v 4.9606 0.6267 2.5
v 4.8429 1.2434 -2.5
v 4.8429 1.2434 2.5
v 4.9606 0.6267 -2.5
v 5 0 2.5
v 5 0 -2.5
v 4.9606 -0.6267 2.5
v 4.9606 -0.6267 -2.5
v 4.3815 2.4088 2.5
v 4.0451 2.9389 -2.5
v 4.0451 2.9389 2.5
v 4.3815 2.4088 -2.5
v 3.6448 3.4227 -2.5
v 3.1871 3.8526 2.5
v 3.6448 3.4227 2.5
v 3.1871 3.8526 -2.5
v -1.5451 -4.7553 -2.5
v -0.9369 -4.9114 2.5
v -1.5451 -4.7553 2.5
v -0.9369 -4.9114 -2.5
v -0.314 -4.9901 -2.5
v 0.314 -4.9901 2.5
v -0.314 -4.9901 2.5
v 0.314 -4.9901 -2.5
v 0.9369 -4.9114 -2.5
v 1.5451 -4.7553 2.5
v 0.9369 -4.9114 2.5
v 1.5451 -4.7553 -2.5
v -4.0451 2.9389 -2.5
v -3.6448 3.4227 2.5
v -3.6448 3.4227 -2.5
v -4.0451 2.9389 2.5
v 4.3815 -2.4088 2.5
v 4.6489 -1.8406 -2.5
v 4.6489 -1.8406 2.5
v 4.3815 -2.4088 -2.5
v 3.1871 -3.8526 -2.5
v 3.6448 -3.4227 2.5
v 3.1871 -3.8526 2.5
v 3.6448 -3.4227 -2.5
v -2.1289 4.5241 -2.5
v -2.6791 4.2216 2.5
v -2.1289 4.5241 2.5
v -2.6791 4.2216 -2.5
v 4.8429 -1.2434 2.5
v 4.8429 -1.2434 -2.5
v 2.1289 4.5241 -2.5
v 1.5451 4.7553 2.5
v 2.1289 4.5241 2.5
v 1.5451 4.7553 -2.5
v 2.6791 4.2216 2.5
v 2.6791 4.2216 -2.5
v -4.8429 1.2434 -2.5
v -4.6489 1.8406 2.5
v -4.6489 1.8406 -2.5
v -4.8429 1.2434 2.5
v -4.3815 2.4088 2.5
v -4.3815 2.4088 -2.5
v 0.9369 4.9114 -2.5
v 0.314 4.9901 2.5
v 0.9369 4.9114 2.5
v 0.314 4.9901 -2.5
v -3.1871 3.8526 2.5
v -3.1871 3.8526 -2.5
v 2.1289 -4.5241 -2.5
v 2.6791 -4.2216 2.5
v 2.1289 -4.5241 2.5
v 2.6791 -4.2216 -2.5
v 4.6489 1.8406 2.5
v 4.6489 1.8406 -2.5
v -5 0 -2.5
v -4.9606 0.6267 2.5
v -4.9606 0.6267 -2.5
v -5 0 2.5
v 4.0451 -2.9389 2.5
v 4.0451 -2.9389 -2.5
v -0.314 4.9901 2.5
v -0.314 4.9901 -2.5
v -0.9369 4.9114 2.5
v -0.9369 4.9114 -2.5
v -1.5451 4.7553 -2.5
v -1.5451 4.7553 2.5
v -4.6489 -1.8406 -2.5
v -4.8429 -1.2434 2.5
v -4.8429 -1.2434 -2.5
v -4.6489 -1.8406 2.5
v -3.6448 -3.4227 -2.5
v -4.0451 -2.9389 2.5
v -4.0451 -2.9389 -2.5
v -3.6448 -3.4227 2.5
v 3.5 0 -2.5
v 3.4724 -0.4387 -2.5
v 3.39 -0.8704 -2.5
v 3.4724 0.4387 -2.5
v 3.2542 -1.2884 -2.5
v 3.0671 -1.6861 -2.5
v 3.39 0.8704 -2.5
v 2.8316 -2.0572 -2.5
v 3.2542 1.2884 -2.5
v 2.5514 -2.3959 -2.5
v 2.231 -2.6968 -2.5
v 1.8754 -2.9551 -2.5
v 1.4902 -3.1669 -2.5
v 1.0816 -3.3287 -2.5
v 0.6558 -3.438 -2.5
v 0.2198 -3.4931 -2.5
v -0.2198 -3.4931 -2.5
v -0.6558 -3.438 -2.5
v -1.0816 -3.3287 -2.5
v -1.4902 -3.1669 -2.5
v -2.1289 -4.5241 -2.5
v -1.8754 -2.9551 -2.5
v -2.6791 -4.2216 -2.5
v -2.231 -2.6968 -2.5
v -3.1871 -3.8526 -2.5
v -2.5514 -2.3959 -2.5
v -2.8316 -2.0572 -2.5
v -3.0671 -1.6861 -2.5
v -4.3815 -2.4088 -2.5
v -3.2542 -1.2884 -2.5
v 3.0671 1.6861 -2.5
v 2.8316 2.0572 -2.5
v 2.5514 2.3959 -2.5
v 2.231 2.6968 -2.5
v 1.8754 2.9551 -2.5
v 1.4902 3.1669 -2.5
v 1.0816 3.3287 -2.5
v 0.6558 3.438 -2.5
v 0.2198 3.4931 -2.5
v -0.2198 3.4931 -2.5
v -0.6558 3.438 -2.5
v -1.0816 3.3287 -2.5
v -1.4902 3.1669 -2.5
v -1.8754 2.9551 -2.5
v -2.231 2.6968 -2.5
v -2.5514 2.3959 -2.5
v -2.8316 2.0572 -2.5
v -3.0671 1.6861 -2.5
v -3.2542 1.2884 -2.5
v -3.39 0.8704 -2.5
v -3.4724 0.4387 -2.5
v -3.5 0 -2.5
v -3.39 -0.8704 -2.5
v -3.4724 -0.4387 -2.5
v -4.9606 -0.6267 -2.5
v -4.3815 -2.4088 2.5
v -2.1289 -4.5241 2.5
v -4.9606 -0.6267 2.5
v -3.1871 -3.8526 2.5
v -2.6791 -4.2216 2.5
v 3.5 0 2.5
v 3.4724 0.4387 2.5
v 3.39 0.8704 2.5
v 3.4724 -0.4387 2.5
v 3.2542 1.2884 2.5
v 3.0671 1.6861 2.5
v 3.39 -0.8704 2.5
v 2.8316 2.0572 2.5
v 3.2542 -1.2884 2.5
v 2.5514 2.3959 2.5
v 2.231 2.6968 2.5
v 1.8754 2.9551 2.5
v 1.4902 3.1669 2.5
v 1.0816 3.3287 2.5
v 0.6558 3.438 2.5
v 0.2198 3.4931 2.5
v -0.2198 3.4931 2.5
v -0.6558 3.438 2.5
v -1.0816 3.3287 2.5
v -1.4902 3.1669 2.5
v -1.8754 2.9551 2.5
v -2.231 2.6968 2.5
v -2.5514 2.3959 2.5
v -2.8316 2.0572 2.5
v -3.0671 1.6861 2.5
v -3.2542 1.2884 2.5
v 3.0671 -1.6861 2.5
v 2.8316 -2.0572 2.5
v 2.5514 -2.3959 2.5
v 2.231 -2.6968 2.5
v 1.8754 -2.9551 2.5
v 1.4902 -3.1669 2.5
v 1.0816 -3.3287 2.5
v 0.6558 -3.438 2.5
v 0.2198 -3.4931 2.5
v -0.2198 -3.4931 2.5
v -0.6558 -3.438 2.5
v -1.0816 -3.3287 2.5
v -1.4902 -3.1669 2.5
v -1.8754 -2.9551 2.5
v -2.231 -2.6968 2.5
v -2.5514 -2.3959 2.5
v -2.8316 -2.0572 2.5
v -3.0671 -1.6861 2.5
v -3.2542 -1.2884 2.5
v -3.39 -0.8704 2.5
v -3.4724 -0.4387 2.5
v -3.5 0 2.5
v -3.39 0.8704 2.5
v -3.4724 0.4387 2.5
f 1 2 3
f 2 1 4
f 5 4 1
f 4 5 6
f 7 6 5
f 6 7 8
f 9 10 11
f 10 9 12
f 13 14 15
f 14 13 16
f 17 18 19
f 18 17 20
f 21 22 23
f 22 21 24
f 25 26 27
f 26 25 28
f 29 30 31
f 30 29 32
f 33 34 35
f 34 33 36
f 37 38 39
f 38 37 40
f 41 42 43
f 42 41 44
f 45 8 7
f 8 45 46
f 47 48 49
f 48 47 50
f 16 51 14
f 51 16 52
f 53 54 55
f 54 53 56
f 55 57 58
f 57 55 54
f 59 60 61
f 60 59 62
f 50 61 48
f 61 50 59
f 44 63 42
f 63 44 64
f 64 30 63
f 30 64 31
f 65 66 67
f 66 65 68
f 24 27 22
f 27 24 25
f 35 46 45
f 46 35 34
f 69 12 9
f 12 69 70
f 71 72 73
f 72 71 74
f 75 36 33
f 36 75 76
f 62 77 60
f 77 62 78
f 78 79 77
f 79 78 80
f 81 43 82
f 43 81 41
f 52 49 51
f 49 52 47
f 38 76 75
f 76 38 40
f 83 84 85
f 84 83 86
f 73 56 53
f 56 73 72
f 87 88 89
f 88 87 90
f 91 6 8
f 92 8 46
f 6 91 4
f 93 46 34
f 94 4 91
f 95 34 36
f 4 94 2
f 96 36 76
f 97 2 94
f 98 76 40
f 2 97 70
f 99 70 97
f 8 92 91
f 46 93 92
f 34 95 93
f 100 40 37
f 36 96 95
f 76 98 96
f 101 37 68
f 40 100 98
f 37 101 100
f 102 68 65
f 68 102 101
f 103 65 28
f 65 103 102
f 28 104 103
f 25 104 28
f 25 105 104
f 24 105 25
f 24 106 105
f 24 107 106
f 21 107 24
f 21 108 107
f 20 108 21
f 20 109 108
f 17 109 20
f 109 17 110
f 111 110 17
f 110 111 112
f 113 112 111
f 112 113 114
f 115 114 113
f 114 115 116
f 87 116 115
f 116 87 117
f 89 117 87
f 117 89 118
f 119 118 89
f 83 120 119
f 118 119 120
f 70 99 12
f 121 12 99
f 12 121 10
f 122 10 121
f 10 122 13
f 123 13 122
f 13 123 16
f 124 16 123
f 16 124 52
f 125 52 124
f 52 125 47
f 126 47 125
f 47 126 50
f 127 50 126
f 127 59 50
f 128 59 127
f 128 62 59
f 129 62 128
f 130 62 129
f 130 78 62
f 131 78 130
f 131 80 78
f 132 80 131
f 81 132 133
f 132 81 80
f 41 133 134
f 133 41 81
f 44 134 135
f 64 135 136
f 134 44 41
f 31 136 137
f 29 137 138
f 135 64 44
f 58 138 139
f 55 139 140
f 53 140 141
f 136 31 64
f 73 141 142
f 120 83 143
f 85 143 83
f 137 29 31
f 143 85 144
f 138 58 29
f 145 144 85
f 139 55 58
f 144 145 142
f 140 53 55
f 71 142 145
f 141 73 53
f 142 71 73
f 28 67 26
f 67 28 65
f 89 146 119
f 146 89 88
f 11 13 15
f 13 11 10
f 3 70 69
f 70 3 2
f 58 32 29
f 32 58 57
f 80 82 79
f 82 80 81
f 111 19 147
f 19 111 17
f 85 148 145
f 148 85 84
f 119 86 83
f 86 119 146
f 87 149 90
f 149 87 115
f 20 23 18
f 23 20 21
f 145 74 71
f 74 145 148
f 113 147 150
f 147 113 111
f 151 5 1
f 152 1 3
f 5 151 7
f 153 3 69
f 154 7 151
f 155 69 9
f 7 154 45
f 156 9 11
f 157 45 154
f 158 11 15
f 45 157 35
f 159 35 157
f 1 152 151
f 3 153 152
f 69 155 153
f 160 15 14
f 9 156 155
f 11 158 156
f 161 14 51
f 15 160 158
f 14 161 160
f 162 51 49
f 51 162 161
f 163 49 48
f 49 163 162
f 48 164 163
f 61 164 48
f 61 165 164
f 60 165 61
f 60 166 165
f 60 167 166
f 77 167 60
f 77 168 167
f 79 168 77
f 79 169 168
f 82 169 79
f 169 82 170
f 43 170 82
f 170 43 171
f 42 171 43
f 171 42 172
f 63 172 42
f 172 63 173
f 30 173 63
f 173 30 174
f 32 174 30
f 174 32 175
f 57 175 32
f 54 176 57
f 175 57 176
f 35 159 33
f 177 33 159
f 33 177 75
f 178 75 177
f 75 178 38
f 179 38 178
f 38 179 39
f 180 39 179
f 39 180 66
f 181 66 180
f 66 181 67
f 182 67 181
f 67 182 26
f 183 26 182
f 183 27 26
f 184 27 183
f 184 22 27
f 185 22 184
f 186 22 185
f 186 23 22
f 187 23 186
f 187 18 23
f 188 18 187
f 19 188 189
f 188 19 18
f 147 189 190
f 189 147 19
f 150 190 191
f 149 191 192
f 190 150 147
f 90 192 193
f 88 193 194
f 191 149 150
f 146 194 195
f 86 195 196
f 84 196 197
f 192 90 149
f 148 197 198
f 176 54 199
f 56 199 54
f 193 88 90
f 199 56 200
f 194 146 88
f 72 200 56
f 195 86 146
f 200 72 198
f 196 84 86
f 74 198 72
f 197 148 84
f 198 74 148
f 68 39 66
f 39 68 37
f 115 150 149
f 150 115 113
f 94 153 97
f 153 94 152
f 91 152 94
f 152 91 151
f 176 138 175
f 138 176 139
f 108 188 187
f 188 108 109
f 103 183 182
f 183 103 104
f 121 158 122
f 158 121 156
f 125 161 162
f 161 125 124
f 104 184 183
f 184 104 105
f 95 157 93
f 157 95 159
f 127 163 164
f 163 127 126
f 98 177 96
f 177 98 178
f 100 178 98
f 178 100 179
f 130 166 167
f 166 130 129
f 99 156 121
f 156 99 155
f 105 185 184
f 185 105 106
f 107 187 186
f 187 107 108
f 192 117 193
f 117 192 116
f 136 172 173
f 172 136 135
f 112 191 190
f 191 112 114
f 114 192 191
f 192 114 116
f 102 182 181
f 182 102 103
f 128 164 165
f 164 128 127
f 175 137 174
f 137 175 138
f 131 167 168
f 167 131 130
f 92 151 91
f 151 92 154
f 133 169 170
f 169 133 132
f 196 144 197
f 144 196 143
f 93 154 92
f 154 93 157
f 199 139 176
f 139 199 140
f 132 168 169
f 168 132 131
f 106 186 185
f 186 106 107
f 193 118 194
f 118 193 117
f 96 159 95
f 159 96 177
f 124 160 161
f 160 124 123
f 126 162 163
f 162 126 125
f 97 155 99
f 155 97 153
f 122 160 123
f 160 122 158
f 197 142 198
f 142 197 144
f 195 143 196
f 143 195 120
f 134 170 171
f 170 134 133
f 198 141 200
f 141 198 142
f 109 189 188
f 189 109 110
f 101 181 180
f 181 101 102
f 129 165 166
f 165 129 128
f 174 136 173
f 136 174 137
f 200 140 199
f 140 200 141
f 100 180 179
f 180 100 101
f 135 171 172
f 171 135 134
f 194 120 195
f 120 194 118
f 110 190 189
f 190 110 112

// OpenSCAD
$fn = 50;


difference() {
	union() {
		translate(v = [0, 0, -2.5000000000]) {
			cylinder(h = 5, r = 5.0000000000);
		}
	}
	union() {
		translate(v = [0, 0, -100.0000000000]) {
			cylinder(h = 200, r = 3.5000000000);
		}
	}
}
